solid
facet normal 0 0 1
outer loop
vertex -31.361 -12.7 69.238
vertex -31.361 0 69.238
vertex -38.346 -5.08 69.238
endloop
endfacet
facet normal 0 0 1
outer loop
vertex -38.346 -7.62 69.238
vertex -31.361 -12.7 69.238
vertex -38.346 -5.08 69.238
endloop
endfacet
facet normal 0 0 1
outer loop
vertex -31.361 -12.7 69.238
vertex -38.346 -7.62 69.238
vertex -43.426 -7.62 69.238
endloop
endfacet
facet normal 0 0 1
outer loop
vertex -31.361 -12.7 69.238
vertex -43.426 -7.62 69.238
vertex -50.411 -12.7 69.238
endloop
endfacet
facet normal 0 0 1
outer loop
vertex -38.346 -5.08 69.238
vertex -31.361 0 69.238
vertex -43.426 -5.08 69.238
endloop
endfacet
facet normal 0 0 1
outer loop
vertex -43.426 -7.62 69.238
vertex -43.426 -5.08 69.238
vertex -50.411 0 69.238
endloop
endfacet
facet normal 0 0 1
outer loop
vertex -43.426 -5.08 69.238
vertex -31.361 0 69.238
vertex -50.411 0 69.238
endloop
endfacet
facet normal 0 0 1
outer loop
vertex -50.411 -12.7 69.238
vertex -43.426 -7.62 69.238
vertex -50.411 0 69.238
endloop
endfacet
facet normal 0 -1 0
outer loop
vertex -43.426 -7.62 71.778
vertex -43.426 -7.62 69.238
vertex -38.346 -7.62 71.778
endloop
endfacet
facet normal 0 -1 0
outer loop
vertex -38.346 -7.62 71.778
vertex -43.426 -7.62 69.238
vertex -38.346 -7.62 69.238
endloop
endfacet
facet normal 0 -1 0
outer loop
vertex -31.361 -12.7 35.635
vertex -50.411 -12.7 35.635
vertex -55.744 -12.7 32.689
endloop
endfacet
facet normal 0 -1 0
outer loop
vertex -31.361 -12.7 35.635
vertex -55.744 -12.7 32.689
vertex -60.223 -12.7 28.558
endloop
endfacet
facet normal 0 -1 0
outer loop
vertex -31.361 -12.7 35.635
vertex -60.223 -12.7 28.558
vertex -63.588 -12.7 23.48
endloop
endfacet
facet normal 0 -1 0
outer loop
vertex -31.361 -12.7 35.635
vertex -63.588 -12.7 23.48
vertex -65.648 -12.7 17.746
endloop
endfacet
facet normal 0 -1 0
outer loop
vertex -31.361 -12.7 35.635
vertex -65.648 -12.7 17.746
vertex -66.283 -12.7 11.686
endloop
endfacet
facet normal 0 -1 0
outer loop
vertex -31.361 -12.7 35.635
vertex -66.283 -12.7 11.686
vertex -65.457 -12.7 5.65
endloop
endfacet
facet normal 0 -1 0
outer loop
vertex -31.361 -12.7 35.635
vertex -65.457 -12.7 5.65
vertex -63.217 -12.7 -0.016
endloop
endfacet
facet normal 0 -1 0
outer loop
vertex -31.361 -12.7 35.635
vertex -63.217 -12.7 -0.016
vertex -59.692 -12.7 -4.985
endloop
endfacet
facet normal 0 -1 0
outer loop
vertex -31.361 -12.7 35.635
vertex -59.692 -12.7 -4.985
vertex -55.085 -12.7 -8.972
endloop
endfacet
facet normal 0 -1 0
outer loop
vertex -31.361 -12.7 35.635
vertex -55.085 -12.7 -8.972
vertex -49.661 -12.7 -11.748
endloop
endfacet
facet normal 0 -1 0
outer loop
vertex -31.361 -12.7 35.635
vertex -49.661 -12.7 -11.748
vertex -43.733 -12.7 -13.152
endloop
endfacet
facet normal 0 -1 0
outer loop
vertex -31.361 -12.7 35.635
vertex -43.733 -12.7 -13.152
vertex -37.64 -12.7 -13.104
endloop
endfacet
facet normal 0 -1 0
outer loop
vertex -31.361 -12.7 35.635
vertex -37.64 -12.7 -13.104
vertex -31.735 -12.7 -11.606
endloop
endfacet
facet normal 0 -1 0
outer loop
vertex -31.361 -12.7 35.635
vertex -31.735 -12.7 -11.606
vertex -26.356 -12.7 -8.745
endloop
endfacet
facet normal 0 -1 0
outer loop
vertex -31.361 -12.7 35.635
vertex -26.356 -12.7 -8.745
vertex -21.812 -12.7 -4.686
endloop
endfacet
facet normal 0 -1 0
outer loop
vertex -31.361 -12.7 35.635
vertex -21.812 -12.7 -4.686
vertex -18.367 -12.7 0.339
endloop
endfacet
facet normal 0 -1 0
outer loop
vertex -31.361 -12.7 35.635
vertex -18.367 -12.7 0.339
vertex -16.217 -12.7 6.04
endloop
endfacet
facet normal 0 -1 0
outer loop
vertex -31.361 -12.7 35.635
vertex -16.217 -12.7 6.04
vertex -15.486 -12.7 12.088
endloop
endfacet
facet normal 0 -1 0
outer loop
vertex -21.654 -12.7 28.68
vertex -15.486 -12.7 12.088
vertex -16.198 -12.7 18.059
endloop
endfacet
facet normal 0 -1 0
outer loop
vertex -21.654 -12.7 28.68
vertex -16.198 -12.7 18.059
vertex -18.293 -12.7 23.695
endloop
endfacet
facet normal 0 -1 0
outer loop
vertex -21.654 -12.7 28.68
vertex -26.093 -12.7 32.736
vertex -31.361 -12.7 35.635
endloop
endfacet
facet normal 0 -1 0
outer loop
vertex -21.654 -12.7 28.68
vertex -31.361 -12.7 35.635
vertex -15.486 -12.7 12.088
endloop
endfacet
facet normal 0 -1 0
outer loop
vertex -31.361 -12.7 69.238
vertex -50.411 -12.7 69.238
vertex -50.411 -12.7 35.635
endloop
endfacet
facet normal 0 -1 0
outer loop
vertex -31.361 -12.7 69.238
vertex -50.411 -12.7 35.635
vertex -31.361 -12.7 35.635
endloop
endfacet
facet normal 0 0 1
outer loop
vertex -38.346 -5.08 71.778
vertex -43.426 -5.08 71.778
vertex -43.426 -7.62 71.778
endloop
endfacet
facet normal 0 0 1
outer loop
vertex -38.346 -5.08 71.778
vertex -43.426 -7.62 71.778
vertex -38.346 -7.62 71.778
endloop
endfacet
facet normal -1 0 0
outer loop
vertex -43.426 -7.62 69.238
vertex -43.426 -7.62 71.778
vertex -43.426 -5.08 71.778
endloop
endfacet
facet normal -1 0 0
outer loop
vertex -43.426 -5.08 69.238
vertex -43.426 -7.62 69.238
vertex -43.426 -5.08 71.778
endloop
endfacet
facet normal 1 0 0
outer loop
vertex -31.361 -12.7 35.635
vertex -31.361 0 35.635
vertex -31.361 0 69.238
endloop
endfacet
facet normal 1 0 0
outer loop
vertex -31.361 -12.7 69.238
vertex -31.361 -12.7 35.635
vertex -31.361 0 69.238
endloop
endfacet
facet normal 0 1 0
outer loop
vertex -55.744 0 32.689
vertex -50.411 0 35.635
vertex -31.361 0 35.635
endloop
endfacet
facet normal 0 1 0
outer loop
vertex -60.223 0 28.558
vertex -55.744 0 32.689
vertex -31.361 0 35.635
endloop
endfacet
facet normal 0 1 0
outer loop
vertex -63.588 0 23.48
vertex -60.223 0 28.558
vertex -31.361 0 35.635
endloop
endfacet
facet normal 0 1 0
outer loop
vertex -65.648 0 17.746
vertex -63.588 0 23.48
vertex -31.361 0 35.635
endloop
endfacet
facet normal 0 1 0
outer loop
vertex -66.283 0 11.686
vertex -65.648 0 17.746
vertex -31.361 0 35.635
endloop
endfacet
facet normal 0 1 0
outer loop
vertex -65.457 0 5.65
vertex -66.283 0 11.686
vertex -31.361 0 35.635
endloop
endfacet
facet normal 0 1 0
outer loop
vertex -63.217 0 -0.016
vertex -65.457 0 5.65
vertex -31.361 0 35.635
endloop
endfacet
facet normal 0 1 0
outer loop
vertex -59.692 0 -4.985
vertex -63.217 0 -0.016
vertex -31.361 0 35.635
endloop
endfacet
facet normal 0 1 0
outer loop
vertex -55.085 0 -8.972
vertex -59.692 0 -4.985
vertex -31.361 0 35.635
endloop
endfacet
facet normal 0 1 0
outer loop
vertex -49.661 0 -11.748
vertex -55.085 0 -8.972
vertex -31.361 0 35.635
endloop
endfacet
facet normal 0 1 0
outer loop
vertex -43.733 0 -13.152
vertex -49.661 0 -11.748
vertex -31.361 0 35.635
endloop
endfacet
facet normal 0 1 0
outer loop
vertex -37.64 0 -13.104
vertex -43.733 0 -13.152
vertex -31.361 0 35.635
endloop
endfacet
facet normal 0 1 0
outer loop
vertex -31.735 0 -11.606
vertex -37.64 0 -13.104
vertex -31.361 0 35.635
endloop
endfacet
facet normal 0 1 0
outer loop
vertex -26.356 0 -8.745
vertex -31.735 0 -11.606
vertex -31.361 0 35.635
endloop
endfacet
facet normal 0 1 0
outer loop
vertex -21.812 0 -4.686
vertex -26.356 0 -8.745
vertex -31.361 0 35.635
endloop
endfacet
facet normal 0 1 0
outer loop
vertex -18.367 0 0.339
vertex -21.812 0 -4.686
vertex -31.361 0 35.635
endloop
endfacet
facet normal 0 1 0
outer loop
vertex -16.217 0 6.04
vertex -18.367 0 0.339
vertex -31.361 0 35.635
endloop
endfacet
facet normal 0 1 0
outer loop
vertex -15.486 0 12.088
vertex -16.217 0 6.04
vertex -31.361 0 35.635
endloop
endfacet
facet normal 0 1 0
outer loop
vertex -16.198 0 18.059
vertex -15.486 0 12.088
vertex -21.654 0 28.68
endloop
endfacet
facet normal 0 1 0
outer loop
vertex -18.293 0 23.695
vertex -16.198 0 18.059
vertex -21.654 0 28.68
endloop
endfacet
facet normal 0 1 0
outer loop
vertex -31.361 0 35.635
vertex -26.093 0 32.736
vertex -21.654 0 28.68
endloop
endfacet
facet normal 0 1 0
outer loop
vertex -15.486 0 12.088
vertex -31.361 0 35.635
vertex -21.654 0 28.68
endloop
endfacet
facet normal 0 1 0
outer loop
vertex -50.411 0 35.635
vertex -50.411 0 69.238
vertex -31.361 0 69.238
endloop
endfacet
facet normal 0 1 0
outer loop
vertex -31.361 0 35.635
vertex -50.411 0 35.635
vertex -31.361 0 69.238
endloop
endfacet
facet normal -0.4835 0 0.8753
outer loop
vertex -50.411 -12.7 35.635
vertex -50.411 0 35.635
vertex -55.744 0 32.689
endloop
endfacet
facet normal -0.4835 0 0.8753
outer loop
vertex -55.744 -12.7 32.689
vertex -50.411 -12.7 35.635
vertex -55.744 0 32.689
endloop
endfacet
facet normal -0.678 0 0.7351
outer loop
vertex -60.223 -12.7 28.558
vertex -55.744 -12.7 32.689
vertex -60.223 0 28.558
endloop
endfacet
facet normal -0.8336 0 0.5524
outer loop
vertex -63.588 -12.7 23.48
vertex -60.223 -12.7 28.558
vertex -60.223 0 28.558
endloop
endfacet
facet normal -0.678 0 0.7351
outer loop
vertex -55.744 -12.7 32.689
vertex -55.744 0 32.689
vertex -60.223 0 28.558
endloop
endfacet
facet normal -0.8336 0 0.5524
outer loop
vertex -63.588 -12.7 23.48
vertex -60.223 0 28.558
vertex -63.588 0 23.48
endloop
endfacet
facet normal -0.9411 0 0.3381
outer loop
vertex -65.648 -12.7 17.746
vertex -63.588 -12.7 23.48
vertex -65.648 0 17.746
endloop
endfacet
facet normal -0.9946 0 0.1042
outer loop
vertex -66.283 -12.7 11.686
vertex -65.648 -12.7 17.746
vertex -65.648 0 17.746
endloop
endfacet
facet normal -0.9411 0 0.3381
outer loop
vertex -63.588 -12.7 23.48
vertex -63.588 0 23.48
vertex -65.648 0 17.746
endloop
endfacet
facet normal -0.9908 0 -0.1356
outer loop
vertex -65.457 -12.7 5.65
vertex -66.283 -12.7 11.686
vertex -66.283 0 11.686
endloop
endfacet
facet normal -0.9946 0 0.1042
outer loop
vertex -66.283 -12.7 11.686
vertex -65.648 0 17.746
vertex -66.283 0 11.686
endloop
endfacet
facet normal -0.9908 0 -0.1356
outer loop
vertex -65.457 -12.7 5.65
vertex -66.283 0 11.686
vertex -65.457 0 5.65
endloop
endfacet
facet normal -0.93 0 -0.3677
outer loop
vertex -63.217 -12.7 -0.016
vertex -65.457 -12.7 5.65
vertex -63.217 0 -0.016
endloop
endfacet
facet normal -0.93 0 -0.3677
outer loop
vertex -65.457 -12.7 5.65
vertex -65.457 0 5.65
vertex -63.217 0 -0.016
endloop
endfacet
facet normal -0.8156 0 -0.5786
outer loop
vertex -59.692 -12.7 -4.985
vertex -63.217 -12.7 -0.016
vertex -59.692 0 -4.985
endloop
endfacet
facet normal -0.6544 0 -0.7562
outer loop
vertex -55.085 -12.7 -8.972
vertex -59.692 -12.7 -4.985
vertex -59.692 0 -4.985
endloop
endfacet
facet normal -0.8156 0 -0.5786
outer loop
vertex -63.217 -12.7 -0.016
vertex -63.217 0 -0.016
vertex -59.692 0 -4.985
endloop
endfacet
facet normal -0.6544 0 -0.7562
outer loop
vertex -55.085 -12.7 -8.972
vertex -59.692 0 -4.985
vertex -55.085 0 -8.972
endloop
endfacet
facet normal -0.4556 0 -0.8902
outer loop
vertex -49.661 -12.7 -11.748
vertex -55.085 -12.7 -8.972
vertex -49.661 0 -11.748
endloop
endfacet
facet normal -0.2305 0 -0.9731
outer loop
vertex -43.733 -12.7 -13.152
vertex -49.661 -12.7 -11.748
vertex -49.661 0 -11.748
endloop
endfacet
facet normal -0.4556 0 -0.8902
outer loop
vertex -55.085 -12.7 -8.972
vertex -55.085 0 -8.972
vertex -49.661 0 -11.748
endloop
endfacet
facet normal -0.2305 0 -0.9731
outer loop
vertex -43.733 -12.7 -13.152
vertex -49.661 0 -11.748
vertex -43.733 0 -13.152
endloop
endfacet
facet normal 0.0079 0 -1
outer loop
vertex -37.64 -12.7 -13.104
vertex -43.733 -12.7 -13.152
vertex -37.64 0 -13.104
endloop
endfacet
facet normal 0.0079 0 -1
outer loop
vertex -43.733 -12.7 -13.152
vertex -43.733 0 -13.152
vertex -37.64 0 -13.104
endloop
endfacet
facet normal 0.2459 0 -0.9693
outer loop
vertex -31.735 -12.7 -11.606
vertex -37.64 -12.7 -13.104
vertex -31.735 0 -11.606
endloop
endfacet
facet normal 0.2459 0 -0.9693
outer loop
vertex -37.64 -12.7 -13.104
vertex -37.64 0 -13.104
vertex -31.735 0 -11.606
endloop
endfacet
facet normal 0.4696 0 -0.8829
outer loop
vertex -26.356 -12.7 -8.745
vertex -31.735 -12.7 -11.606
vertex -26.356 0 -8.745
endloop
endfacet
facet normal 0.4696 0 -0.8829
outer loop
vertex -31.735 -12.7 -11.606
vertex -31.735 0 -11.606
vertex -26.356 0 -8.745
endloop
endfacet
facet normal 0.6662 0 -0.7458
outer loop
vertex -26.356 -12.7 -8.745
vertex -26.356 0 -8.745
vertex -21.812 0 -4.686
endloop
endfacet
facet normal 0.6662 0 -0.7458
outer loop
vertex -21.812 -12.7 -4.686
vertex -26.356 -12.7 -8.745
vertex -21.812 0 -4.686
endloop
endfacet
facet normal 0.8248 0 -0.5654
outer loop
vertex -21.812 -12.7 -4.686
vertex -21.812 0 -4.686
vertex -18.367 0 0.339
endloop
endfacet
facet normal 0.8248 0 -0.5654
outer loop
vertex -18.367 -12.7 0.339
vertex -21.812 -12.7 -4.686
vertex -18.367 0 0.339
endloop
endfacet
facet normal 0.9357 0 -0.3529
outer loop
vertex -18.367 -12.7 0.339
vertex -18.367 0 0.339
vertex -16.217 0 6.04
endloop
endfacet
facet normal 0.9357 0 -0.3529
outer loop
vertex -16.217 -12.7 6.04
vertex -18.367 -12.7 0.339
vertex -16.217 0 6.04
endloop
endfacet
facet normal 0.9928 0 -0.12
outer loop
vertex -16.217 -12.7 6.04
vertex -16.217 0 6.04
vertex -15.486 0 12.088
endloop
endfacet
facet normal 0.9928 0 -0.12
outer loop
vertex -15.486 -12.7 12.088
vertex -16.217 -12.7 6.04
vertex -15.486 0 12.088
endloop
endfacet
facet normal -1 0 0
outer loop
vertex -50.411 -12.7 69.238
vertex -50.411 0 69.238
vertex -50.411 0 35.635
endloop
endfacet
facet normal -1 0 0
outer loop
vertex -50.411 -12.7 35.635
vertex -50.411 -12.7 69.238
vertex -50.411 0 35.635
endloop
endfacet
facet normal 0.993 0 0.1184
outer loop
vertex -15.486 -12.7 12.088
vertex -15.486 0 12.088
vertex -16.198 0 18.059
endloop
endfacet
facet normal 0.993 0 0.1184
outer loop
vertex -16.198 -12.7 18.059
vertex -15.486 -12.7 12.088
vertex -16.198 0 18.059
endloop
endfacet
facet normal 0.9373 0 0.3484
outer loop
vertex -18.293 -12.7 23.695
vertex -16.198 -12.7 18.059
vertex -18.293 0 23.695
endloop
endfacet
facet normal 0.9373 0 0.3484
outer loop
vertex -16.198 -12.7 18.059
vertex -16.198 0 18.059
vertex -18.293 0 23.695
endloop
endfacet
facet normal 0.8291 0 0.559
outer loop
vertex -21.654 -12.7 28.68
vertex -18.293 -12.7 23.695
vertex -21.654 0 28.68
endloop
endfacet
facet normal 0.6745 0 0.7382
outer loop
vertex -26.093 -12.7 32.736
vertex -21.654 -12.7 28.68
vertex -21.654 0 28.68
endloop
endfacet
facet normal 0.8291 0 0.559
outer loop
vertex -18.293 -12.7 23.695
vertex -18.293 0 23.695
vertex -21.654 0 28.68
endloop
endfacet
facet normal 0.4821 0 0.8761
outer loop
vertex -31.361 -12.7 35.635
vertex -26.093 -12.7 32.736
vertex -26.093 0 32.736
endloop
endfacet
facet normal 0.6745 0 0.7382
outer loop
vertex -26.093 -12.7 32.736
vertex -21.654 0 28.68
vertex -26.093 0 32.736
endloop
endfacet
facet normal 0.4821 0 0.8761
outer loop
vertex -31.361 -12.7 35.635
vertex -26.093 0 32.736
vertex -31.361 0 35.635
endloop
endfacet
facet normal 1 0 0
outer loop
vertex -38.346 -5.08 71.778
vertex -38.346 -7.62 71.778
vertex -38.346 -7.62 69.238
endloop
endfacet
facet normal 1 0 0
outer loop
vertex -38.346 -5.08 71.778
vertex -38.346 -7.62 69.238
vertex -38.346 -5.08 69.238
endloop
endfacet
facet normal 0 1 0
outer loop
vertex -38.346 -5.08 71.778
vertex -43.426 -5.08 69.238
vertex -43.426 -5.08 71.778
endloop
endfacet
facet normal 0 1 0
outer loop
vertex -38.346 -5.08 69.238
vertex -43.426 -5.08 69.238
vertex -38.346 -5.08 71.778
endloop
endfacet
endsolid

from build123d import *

# Parameters (mm, degrees)
F0_DEPTH = 12.7
F1_W     = 5.08
F1_H     = 2.54
F2_DEPTH = 2.54


with BuildPart() as f0:
    # F3 (on Front) → F0 (new body)
    with BuildSketch(Plane.XZ):
        with BuildLine():
            Line((-31.361033, 69.238202), (-50.411033, 69.238202))
            Line((-50.411033, 69.238202), (-50.411033, 35.634632))
            ThreePointArc((-50.411033, 35.634632), (-40.886033, 37.488202), (-31.361033, 35.634632))
            Line((-31.361033, 35.634632), (-31.361033, 69.238202))
        make_face()
        with BuildLine():
            ThreePointArc((-31.361033, 35.634632), (-40.886033, 37.488202), (-50.411033, 35.634632))
            Line((-50.411033, 35.634632), (-50.411033, 12.088202))
            Line((-50.411033, 12.088202), (-31.361033, 12.088202))
            Line((-31.361033, 12.088202), (-31.361033, 35.634632))
        make_face()
        with BuildLine():
            Line((-50.411033, 12.088202), (-50.411033, 35.634632))
            ThreePointArc((-50.411033, 35.634632), (-55.085064, -8.972365), (-15.486033, 12.088202))
            ThreePointArc((-15.486033, 12.088202), (-19.825465, 26.287234), (-31.361033, 35.634632))
            Line((-31.361033, 35.634632), (-31.361033, 12.088202))
            Line((-31.361033, 12.088202), (-50.411033, 12.088202))
        make_face()
    extrude(amount=F0_DEPTH)

    # F1 (on face) → F2 (join)
    with BuildSketch(Plane.XY.offset(69.238202)):
        with Locations((-40.886033, -6.35)):
            Rectangle(F1_W, F1_H)
    extrude(amount=F2_DEPTH)


solid = f0.part
